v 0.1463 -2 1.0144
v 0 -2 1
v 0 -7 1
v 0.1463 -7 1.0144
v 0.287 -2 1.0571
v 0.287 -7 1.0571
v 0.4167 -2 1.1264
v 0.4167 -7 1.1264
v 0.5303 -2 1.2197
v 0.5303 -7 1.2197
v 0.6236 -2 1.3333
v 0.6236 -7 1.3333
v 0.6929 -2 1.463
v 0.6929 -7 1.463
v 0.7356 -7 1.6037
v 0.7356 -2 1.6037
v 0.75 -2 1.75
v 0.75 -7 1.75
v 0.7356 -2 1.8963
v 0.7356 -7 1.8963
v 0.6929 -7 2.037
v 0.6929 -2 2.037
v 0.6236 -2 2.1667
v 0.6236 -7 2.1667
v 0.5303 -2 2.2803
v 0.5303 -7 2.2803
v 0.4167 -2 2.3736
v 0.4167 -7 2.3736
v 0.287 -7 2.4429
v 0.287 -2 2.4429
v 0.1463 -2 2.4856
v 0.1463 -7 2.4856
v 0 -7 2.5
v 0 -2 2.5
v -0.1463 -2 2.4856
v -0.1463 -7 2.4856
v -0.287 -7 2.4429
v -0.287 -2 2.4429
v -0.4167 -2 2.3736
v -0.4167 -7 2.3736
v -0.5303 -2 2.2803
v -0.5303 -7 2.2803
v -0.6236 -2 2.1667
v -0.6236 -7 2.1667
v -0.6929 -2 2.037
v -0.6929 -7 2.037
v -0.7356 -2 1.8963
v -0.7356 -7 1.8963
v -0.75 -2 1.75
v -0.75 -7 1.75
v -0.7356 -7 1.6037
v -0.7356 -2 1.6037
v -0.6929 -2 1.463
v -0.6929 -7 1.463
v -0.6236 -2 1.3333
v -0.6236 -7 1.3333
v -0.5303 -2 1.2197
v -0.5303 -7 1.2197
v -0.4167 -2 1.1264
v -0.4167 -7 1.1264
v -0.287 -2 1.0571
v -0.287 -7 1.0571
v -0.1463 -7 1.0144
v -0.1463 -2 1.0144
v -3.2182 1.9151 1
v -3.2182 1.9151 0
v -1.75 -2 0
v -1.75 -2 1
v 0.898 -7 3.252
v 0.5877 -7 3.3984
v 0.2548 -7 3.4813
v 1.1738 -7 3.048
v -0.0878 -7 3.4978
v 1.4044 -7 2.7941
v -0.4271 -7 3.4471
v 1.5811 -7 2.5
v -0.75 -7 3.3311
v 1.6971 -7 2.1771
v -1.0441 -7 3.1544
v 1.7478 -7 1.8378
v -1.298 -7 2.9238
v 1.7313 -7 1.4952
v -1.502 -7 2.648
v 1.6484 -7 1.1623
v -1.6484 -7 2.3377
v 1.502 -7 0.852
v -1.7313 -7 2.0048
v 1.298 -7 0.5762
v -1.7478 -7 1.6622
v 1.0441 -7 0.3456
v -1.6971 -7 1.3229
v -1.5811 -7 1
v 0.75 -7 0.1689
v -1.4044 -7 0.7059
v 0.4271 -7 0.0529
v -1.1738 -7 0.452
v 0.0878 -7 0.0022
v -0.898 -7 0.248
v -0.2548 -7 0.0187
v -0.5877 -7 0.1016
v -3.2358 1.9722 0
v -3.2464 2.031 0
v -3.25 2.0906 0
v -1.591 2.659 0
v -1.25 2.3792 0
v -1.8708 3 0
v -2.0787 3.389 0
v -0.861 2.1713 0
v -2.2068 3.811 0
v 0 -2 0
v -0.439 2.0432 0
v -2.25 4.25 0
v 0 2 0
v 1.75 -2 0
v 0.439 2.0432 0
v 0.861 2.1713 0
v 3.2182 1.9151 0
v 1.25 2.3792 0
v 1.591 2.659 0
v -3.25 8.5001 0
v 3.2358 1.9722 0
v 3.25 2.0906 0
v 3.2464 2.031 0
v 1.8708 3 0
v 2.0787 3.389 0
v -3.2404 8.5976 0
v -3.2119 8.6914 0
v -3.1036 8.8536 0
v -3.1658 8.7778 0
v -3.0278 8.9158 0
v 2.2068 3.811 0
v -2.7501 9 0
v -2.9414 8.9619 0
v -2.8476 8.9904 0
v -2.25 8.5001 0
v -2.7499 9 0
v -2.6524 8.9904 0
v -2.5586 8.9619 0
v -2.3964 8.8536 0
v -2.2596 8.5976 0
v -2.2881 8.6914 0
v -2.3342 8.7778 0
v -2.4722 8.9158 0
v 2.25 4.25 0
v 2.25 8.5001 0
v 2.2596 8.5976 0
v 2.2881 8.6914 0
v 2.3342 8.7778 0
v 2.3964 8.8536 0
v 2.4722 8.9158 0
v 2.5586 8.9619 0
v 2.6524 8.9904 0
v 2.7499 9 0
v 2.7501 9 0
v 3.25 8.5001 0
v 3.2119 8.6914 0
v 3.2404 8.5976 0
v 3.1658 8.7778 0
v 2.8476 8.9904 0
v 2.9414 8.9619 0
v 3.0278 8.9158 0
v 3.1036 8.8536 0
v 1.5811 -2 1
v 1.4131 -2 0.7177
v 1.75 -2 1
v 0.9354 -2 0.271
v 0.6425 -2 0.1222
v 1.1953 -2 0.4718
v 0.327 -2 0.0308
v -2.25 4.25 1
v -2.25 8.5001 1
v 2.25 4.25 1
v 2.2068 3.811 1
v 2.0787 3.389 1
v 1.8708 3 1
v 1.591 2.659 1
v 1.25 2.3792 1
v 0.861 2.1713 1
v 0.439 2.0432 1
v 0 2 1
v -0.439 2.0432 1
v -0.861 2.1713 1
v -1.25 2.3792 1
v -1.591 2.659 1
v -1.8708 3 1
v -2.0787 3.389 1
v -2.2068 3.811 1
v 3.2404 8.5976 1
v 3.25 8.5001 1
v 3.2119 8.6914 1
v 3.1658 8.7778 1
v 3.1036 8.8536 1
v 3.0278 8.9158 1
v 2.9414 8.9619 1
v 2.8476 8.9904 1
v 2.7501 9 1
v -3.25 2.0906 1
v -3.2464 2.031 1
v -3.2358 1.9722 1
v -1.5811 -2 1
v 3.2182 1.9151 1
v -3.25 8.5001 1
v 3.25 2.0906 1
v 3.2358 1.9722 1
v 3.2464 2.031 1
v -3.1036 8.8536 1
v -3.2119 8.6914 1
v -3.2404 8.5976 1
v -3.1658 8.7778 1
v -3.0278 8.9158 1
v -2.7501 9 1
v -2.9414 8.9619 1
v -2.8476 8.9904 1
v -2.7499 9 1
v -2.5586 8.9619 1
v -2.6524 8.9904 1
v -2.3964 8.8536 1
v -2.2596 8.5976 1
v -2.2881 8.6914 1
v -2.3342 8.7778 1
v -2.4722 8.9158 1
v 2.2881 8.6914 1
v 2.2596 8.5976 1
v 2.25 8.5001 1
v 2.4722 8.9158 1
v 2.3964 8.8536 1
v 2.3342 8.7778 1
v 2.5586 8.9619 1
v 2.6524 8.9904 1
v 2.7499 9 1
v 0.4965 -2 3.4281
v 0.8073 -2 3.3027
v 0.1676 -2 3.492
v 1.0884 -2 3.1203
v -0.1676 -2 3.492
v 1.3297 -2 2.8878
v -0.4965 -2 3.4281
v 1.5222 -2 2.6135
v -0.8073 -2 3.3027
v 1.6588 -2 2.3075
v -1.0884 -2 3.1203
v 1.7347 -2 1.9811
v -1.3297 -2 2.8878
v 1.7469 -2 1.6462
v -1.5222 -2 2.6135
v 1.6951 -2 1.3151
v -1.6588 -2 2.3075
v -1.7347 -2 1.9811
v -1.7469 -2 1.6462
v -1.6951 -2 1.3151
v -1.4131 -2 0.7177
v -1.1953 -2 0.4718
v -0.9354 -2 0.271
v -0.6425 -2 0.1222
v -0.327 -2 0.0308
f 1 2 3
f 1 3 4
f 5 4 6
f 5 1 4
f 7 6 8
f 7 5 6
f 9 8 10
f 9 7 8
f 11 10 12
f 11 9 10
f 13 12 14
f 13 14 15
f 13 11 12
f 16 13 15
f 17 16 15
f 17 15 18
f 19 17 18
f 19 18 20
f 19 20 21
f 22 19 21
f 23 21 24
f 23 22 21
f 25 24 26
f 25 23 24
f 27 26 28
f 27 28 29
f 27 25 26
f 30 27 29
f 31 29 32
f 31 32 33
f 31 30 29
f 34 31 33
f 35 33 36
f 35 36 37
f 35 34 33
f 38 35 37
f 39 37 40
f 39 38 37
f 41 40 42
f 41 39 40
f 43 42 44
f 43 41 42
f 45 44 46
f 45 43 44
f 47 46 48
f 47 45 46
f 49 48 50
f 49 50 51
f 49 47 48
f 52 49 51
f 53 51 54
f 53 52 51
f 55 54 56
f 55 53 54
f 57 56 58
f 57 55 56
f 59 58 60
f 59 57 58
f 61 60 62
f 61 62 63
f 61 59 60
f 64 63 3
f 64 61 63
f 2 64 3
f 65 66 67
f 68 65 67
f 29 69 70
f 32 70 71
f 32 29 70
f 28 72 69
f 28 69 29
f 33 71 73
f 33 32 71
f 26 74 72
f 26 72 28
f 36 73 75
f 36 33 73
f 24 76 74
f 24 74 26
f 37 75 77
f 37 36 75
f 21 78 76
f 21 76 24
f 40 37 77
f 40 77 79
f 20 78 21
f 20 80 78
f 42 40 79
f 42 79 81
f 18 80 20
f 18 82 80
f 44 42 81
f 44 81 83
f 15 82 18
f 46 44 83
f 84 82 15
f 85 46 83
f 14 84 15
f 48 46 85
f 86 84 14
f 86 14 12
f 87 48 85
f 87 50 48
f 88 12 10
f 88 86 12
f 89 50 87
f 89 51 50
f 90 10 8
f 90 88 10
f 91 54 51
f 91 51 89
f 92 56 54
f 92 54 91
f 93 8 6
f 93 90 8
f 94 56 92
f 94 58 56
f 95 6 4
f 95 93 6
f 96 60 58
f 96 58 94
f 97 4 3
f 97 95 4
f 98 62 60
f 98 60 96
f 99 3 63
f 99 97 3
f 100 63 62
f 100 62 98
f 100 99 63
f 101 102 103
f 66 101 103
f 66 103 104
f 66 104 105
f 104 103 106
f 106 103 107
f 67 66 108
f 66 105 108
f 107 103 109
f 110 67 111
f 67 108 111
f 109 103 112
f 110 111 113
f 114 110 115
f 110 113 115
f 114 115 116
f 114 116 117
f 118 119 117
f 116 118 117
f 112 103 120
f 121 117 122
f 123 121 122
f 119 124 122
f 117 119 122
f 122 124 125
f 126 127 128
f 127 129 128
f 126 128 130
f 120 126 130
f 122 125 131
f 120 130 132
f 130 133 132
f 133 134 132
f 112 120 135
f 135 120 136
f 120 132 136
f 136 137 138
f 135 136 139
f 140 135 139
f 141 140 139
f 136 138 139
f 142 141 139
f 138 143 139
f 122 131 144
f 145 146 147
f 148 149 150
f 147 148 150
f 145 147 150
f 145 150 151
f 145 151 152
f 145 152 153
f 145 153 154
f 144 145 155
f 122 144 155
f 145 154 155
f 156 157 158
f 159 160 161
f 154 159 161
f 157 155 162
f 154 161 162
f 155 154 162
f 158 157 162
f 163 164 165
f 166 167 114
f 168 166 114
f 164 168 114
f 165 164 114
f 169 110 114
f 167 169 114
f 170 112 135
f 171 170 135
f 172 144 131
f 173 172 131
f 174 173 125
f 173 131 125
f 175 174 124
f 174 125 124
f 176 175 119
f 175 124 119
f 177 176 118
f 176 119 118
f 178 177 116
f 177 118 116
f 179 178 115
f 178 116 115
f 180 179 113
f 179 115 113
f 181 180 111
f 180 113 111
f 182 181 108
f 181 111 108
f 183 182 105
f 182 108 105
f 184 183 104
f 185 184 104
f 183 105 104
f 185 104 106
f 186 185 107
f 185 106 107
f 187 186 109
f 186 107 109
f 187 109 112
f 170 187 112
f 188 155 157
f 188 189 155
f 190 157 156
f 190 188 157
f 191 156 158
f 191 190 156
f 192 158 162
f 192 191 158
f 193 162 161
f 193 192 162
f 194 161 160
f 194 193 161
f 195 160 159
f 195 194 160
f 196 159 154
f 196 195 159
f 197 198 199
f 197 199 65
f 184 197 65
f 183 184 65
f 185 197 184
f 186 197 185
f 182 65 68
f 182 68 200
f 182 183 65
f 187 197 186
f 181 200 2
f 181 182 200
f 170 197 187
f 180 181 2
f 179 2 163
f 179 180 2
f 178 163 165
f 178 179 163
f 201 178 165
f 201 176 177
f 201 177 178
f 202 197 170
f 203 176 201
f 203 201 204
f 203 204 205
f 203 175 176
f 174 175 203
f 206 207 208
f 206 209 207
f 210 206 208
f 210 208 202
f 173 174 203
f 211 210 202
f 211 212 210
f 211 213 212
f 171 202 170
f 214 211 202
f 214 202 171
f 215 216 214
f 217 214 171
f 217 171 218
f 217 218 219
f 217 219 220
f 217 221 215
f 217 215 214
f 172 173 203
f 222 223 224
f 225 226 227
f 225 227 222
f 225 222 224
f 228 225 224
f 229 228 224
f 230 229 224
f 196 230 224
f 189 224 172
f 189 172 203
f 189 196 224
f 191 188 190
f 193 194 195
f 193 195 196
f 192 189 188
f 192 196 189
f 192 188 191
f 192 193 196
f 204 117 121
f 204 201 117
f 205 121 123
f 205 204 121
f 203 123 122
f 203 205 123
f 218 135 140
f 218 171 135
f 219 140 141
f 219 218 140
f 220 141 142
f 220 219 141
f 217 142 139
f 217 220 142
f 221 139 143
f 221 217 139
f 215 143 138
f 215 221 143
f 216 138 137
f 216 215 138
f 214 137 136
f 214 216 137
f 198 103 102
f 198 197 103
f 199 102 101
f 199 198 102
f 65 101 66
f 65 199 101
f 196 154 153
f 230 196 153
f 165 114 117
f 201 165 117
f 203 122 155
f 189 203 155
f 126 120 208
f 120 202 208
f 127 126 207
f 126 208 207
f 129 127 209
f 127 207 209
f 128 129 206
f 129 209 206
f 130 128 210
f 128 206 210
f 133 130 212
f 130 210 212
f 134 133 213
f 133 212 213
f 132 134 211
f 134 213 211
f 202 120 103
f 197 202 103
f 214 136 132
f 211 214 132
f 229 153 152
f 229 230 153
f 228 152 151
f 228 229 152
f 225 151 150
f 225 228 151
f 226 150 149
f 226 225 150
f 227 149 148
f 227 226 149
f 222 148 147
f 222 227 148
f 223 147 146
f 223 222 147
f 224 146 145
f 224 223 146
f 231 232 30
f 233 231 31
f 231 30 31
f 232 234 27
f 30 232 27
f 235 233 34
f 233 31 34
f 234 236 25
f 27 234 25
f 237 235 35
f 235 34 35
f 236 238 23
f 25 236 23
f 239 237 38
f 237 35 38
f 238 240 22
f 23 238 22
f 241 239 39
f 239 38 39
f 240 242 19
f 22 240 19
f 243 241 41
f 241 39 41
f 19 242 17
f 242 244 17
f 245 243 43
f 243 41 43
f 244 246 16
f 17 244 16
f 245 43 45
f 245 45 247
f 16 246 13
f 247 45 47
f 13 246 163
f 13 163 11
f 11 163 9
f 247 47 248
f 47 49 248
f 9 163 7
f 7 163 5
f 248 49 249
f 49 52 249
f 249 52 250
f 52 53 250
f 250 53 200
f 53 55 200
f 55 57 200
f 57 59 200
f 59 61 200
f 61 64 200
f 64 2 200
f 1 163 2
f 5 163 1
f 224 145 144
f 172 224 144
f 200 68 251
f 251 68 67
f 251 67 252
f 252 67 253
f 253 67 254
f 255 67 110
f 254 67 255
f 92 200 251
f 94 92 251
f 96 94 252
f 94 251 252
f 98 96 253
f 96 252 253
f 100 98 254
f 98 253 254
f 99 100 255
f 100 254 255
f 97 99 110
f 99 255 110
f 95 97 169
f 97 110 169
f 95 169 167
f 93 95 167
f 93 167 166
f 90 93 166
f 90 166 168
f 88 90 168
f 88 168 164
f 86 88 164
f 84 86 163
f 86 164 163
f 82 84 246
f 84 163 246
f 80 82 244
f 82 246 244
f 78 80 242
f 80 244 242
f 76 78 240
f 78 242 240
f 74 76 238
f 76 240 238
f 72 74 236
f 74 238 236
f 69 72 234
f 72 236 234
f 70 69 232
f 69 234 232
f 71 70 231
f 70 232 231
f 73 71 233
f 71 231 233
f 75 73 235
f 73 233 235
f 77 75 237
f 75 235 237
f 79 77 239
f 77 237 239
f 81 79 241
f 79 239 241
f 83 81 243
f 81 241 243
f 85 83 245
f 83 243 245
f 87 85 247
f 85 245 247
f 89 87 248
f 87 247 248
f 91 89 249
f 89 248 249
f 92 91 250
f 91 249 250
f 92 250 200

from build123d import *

# Parameters (mm, degrees)
AUFSATZ_LINEAR_AUSTRAGEN1_DEPTH = 1
VERRUNDUNG1_R                   = 0.5
SKIZZE2_R                       = 1.75
SKIZZE2_R_2                     = 0.75
AUFSATZ_LINEAR_AUSTRAGEN2_DEPTH = 5


with BuildPart() as part:
    # Skizze1 → Aufsatz-Linear austragen1 (new body)
    with BuildSketch(Plane.XY):
        with BuildLine():
            Line((-3.25, 9), (-3.25, 2))
            Line((-3.25, 2), (-1.75, -2))
            Line((-1.75, -2), (1.75, -2))
            Line((1.75, -2), (3.25, 2))
            Line((3.25, 2), (3.25, 9))
            Line((3.25, 9), (2.25, 9))
            Line((2.25, 9), (2.25, 4.25))
            ThreePointArc((2.25, 4.25), (0, 2), (-2.25, 4.25))
            Line((-2.25, 4.25), (-2.25, 9))
            Line((-2.25, 9), (-3.25, 9))
        make_face()
    extrude(amount=AUFSATZ_LINEAR_AUSTRAGEN1_DEPTH)

    # Verrundung1
    verrundung1_edges = [part.edges().sort_by_distance(p)[0] for p in [
        (-3.25, 2, 0.5),
        (3.25, 2, 0.5),
        (3.25, 9, 0.5),
        (2.25, 9, 0.5),
        (-2.25, 9, 0.5),
        (-3.25, 9, 0.5),
    ]]
    fillet(verrundung1_edges, radius=VERRUNDUNG1_R - 0.0001)  # a hair under: the kernel refuses the full size

    # Skizze2 → Aufsatz-Linear austragen2 (add)
    with BuildSketch(Plane.XZ.offset(2)):
        with Locations(Location((0, 1.75, 0), (0, 0, 205.376933525))):
            Circle(SKIZZE2_R)
        with Locations(Location((0, 1.75, 0), (0, 0, 270))):
            Circle(SKIZZE2_R_2, mode=Mode.SUBTRACT)
    extrude(amount=AUFSATZ_LINEAR_AUSTRAGEN2_DEPTH)


solid = part.part
